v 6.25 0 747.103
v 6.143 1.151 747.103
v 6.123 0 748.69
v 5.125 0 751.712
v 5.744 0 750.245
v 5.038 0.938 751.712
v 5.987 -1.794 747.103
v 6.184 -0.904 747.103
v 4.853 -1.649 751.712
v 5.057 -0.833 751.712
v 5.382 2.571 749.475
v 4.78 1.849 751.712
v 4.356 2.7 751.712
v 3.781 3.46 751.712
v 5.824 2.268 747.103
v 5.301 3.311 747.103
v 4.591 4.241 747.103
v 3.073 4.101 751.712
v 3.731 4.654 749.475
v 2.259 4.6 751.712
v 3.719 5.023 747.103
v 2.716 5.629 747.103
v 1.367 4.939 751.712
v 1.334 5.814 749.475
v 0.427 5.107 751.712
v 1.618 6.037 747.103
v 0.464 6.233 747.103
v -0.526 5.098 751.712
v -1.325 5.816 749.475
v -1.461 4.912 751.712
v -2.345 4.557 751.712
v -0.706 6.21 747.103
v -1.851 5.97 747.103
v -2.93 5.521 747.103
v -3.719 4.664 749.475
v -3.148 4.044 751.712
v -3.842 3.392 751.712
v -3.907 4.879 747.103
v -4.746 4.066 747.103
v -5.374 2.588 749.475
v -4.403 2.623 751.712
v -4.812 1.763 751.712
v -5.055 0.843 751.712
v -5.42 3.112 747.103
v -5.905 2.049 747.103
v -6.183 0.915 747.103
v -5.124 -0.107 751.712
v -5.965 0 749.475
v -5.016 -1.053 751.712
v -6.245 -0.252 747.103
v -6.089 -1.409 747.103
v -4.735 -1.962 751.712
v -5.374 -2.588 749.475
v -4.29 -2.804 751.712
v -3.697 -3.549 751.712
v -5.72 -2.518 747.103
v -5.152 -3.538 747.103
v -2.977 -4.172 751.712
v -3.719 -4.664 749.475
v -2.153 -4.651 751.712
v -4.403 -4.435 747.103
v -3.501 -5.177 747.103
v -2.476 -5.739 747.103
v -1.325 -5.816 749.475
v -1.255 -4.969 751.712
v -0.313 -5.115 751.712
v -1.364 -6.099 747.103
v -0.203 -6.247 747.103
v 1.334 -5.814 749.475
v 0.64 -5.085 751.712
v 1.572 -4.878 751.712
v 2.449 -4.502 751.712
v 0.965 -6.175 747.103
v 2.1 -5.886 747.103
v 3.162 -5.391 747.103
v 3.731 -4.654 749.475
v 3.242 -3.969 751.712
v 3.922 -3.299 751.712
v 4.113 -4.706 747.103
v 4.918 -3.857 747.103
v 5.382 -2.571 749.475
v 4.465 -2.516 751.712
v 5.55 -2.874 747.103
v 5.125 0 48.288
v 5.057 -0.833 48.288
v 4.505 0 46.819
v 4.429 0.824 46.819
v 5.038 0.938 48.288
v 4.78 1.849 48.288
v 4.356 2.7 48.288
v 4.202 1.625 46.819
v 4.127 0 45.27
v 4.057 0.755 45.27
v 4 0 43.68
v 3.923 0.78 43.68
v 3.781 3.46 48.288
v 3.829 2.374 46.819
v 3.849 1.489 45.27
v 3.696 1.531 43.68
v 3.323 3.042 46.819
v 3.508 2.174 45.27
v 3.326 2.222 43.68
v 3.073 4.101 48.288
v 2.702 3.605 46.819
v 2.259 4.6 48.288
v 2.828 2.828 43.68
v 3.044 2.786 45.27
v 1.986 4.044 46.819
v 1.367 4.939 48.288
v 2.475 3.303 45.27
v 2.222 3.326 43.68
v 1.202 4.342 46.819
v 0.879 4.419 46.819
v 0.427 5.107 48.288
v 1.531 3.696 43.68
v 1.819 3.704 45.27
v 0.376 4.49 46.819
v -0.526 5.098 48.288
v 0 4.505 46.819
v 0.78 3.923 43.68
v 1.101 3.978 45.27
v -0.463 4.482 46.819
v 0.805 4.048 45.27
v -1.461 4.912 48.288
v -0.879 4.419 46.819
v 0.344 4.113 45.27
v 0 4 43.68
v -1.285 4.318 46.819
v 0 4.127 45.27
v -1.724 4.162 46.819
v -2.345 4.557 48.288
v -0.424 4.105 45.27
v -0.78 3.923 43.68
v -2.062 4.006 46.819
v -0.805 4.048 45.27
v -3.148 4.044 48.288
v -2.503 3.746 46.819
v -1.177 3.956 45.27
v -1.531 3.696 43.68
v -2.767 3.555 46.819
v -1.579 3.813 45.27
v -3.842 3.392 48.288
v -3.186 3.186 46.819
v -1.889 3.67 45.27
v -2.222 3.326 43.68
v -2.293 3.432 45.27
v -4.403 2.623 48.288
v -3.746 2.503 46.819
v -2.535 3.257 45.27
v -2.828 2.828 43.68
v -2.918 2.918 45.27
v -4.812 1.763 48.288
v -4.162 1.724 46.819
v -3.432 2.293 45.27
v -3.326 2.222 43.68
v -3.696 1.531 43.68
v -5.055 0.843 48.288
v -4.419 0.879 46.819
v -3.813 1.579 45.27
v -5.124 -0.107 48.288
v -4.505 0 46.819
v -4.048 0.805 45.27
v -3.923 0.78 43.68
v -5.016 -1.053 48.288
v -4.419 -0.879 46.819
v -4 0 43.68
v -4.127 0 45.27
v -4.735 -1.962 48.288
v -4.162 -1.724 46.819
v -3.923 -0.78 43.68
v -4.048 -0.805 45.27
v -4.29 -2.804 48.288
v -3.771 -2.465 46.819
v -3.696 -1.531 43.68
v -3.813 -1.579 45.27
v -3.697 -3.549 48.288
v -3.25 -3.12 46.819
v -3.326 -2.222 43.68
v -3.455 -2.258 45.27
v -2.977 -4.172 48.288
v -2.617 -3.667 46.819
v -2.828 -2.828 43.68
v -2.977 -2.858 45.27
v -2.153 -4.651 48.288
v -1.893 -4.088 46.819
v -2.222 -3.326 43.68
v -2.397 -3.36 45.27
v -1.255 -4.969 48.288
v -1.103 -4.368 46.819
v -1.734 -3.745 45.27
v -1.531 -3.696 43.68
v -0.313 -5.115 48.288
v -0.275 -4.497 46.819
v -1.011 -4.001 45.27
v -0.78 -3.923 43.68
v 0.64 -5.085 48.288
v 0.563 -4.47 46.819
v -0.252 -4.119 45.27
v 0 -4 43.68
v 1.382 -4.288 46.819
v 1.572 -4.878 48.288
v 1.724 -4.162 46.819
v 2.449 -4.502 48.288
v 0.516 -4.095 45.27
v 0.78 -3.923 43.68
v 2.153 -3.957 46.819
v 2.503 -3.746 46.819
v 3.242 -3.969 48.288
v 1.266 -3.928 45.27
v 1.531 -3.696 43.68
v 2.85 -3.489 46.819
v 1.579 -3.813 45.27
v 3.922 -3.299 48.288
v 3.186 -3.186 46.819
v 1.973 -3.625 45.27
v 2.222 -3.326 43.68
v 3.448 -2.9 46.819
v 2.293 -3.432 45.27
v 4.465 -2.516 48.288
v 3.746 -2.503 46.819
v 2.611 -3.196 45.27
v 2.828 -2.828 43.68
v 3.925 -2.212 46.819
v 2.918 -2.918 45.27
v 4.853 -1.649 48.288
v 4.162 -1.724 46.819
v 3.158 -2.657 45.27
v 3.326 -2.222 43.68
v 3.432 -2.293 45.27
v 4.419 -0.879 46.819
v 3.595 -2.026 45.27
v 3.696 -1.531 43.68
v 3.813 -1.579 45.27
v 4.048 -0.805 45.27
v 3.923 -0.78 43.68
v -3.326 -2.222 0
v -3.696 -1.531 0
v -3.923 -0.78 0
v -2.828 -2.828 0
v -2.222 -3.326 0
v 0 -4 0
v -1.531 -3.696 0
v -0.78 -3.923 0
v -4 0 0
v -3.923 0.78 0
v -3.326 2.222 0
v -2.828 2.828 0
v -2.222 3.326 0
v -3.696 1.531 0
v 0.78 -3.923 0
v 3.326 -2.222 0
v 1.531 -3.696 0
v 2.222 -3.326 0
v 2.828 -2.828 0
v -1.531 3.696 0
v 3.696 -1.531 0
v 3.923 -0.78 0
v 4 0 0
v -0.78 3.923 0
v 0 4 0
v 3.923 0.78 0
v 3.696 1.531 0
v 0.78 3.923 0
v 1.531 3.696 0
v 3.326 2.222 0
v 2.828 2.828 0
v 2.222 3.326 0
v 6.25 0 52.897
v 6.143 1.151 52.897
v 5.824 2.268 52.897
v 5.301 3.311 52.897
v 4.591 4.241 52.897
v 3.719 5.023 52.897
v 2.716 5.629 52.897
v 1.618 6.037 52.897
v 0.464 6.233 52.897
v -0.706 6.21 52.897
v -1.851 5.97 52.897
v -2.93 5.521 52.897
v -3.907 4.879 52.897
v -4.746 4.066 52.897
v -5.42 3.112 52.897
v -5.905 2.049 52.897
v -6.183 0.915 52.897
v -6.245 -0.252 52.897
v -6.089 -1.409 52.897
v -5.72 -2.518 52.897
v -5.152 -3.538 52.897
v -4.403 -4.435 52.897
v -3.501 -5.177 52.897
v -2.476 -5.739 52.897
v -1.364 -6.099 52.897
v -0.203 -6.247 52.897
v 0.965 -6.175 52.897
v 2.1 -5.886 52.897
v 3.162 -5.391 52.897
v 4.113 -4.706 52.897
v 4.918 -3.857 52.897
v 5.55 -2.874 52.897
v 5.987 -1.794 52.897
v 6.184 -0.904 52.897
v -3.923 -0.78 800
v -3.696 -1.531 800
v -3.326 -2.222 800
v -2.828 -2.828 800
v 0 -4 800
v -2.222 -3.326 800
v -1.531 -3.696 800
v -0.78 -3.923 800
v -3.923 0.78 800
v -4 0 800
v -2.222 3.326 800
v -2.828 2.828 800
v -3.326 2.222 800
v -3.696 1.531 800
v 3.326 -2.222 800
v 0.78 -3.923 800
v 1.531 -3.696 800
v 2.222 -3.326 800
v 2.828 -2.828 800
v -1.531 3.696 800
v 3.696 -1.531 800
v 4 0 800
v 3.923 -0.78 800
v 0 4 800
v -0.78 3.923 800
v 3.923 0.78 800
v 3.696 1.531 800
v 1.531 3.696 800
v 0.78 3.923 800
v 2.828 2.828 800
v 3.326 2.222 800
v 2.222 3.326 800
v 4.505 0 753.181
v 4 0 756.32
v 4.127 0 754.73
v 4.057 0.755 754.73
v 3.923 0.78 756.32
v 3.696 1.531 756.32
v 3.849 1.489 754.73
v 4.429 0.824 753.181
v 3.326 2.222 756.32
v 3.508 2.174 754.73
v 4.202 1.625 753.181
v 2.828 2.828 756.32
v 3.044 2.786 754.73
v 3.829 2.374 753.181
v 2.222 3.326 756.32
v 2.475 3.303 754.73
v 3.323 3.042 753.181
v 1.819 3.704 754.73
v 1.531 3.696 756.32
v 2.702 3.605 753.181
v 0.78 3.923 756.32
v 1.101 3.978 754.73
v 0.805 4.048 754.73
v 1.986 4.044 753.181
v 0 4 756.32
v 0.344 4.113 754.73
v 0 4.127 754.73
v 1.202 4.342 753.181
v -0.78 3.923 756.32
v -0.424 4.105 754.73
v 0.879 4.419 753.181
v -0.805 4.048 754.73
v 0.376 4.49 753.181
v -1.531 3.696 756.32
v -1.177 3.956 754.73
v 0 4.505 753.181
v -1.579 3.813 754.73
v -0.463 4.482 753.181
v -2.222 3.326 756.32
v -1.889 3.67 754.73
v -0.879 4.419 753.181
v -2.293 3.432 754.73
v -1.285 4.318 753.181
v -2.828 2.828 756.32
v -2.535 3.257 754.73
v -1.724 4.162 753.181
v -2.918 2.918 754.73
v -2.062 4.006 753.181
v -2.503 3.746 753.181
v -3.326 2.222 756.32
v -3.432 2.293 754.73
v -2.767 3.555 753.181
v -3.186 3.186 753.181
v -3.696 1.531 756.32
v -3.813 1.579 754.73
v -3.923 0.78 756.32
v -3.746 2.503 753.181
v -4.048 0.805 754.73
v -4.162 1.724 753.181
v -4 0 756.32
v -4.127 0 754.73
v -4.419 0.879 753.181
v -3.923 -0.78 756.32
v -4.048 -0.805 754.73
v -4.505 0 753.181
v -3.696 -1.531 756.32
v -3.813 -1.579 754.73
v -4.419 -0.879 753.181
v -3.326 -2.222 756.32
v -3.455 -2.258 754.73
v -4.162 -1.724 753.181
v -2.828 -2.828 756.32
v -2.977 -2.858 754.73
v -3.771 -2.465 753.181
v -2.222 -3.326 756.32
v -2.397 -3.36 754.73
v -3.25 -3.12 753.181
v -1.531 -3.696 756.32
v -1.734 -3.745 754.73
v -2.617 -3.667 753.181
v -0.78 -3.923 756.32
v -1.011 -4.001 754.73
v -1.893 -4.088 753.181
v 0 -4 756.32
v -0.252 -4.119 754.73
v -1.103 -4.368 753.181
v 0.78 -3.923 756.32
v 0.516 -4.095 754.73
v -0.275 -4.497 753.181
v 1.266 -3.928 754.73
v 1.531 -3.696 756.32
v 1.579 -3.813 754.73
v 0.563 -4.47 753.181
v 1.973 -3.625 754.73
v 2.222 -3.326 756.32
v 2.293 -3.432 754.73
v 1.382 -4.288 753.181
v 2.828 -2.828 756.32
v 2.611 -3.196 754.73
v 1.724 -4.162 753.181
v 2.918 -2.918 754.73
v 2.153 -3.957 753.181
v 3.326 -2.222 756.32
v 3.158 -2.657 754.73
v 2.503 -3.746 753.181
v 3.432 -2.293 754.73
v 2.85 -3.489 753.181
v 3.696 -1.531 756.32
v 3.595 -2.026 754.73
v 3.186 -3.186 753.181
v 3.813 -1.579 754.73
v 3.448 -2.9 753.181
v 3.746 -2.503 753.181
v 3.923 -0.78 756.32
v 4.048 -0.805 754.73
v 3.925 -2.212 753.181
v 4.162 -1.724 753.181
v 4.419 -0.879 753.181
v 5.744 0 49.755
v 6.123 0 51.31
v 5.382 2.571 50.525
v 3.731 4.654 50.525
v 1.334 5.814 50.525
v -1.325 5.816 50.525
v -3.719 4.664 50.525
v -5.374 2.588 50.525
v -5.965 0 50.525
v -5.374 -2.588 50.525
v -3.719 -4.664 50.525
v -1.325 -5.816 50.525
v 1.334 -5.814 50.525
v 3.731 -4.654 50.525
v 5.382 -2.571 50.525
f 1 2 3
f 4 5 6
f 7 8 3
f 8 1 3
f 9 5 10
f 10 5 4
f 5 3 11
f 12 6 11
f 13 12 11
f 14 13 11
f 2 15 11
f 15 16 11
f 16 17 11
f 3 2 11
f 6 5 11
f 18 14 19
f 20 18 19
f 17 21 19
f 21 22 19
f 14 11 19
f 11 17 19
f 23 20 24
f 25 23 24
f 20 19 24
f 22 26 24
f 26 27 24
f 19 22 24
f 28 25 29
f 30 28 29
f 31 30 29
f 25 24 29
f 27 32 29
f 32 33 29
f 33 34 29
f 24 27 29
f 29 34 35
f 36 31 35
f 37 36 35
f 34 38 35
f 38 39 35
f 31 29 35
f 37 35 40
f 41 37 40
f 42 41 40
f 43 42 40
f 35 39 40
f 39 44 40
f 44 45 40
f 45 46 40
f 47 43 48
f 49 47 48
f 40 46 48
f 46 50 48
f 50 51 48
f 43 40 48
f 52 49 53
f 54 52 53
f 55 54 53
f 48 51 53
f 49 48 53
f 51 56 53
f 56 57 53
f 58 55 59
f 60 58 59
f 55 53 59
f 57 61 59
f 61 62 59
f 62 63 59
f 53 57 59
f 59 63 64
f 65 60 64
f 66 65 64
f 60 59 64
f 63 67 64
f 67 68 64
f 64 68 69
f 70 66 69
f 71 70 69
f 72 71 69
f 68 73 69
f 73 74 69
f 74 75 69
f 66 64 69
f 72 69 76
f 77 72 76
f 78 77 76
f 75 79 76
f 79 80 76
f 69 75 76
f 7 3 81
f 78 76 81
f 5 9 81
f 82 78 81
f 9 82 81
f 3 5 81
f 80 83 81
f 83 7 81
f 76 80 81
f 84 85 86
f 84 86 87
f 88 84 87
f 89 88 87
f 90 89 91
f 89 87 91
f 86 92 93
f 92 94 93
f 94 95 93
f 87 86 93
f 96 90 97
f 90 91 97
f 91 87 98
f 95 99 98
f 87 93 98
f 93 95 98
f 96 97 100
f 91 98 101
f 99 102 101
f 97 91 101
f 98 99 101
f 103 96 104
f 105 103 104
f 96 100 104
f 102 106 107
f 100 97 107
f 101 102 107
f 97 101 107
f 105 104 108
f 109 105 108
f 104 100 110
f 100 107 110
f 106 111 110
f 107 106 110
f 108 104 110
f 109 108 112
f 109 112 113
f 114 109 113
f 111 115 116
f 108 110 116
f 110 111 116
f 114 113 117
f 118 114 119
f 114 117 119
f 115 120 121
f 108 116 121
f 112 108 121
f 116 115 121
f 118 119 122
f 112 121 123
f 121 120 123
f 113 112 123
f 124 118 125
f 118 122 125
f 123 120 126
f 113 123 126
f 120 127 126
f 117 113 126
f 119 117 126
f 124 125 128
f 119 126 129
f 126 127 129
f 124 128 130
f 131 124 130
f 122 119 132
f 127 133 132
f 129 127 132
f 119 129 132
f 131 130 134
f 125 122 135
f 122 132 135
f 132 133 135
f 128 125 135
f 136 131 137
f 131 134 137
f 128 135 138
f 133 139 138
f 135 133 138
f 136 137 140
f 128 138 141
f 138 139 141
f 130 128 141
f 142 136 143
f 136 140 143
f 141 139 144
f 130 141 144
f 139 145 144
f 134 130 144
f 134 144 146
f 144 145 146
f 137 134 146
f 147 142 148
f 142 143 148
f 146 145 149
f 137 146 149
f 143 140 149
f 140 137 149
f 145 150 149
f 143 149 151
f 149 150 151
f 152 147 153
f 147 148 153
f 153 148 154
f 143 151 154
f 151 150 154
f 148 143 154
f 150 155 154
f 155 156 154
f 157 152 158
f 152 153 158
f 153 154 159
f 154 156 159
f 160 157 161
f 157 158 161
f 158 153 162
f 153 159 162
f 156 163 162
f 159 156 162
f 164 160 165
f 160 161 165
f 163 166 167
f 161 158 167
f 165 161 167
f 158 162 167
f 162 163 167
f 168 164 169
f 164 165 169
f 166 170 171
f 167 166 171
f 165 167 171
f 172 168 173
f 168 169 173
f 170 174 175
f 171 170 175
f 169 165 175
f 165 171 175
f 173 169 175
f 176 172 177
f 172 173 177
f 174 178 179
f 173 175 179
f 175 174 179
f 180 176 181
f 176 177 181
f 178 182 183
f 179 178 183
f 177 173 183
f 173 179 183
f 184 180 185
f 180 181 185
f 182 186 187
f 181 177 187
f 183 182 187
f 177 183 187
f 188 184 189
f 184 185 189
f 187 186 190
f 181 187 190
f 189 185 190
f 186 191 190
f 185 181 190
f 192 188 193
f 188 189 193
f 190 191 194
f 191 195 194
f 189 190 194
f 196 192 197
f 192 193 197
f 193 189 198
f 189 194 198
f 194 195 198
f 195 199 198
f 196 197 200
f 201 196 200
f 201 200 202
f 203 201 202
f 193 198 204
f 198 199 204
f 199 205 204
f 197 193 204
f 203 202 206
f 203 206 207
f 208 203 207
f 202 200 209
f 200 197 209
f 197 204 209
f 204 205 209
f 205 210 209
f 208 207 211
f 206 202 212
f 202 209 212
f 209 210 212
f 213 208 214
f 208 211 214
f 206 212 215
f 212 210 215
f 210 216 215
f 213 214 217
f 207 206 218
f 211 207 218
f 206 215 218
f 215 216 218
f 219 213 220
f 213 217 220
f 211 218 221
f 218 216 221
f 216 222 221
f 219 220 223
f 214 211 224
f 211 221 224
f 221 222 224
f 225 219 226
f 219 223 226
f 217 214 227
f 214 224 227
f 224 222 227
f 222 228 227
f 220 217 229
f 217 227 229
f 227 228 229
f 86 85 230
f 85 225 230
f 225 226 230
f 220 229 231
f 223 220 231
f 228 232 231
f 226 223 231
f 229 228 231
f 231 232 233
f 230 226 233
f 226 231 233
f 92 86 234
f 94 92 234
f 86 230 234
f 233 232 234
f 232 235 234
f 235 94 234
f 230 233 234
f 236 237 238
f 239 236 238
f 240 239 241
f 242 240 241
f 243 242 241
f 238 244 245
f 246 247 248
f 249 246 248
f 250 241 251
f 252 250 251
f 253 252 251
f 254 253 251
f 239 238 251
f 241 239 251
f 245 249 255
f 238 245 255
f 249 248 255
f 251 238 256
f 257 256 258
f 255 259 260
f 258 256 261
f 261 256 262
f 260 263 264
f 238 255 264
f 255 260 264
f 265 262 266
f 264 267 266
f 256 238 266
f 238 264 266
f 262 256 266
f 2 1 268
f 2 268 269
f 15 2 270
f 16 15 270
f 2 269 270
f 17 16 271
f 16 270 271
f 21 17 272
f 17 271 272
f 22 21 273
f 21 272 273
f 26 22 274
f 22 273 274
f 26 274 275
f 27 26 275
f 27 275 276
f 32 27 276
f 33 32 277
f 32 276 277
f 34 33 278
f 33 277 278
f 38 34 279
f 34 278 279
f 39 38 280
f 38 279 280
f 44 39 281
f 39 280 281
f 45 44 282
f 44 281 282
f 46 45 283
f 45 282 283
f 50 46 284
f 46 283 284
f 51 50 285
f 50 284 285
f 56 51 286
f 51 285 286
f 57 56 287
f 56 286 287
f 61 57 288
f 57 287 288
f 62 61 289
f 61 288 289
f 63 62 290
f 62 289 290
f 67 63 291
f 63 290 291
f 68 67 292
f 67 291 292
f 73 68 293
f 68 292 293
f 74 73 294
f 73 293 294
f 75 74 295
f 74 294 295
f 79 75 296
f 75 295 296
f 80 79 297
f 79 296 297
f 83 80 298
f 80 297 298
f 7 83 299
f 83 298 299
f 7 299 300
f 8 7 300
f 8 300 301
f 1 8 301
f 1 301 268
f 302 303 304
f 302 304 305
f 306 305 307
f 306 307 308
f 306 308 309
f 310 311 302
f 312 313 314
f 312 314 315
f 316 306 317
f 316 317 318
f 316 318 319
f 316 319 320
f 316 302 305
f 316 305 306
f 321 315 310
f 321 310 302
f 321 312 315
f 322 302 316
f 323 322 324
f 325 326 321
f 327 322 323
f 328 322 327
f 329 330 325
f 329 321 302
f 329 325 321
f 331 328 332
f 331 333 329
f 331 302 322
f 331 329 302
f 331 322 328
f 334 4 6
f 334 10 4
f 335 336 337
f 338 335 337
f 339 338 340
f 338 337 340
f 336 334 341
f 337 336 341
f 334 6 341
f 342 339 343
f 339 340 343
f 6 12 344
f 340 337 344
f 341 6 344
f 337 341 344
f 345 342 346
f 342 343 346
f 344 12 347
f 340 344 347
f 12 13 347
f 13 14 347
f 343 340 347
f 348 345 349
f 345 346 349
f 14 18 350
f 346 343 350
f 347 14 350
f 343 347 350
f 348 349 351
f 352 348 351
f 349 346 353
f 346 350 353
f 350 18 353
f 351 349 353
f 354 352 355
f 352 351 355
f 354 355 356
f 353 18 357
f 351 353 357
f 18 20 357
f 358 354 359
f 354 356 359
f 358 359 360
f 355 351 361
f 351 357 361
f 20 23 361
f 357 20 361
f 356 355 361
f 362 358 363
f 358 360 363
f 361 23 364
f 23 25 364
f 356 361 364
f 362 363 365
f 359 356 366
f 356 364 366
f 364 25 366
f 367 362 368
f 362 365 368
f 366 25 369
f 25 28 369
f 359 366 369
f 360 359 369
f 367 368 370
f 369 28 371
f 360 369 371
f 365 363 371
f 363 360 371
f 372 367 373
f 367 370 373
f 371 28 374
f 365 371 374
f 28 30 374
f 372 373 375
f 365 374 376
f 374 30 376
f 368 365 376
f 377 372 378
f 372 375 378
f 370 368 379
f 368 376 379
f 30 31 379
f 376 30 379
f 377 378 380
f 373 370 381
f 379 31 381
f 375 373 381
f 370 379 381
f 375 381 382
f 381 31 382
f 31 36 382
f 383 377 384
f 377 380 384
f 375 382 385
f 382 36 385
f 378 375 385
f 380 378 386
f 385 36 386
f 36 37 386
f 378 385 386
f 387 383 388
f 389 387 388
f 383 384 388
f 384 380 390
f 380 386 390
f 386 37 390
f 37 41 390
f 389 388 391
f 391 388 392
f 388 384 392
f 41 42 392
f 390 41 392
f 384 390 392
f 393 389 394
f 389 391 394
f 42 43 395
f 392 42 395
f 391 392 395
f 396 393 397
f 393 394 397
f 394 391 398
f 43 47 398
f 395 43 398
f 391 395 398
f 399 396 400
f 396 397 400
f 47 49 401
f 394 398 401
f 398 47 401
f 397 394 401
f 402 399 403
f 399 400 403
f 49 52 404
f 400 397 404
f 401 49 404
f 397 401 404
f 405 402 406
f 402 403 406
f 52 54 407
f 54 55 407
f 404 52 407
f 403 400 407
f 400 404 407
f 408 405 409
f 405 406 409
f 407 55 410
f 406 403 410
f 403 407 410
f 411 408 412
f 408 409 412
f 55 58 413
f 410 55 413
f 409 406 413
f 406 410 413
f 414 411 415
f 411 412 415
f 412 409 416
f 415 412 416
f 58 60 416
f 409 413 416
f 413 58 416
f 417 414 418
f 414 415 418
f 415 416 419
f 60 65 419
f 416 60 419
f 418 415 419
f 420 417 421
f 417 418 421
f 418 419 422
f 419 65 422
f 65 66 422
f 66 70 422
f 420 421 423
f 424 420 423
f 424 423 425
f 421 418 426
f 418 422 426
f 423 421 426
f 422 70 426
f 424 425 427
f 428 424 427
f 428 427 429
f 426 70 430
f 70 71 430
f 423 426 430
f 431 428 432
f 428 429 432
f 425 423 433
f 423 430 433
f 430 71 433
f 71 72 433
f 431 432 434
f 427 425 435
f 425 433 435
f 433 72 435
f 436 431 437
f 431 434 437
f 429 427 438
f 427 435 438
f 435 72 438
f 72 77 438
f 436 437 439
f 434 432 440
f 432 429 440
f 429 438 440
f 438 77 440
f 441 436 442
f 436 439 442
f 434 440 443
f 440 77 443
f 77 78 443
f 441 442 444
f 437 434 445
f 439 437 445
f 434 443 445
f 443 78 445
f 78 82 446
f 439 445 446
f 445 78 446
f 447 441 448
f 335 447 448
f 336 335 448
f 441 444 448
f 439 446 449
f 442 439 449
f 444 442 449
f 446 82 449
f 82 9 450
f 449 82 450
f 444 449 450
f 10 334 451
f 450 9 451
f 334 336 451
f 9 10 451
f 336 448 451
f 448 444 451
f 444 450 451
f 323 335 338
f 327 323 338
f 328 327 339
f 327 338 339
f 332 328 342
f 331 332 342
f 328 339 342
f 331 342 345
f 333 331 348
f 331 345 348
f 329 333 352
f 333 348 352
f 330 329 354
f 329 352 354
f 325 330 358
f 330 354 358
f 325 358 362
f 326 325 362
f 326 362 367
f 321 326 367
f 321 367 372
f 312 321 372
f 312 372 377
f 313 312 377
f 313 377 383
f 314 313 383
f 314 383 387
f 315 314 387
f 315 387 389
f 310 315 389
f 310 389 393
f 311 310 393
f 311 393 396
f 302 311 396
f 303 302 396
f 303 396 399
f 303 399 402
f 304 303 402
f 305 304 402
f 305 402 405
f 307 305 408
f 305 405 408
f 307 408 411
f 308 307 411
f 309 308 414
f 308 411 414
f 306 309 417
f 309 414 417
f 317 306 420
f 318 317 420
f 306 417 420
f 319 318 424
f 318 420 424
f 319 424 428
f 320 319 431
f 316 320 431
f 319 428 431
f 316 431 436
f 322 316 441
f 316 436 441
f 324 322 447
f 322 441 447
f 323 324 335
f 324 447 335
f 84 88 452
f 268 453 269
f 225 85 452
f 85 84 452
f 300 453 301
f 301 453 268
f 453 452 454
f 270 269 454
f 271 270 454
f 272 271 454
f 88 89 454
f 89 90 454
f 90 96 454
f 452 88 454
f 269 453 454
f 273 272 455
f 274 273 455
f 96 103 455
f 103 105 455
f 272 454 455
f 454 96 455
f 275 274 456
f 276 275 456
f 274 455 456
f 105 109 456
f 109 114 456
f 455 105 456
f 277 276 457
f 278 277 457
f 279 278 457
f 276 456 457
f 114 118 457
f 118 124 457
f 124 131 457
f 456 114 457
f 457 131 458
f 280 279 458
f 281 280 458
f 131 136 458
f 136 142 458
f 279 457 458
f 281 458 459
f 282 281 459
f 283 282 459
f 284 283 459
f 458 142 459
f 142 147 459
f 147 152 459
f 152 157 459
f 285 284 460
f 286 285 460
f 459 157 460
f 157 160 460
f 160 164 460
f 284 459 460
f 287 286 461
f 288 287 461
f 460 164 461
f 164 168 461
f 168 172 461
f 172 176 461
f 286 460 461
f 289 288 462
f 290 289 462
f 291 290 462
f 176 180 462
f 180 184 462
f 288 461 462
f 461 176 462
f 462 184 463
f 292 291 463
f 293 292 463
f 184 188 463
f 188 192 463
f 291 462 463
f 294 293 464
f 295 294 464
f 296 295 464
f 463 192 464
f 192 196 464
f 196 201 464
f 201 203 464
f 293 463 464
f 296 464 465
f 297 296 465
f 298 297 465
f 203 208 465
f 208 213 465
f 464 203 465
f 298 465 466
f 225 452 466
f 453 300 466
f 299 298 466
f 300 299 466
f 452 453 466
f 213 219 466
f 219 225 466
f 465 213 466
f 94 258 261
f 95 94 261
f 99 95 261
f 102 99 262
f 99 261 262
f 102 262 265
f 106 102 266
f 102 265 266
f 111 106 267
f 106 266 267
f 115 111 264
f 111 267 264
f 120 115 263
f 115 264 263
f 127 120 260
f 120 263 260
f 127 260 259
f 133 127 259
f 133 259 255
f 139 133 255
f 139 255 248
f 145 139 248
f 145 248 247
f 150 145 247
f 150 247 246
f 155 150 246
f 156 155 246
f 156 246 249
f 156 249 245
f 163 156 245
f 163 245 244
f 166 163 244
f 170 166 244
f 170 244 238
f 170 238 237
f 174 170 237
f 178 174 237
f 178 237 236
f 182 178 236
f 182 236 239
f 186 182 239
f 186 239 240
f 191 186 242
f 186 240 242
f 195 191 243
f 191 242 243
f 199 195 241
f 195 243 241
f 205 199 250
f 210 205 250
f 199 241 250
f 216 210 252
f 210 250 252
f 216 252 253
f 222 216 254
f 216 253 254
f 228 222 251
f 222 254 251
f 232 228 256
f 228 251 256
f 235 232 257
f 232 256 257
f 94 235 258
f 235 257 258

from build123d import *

# Parameters (mm, degrees)
SKETCH1_R           = 4
BOSS_EXTRUDE1_DEPTH = 50
SKETCH2_R           = 6.25
BOSS_EXTRUDE2_DEPTH = 700
SKETCH3_R           = 4
BOSS_EXTRUDE3_DEPTH = 50
FILLET1_R           = 10
FILLET2_R           = 10


with BuildPart() as part:
    # Sketch1 → Boss-Extrude1 (new body)
    with BuildSketch(Plane.XY):
        Circle(SKETCH1_R)
    extrude(amount=BOSS_EXTRUDE1_DEPTH)

    # Sketch2 → Boss-Extrude2 (add)
    with BuildSketch(Plane.XY.offset(50)):
        Circle(SKETCH2_R)
    extrude(amount=BOSS_EXTRUDE2_DEPTH)

    # Sketch3 → Boss-Extrude3 (add)
    with BuildSketch(Plane.XY.offset(750)):
        Circle(SKETCH3_R)
    extrude(amount=BOSS_EXTRUDE3_DEPTH)

    # Fillet1
    # the kernel refuses this fillet: 10 mm, written as the material it adds along each edge
    with BuildSketch(Plane(origin=(0, 0, 750), x_dir=(1, 0, 0), z_dir=(0, -1, 0))) as fillet1_piece_1:
        with BuildLine():
            CenterArc((14, 6.31961233), FILLET1_R, 180, 39.194967426)
            Line((4, 6.31961233), (3.8, 6.31961233))
            Line((3.8, 6.31961233), (3.8, 0))
            Line((3.8, 0), (4, -0.2))
            ThreePointArc((4, -0.2), (5.125, -0.2), (6.095, -0.126392247))
            Line((6.095, -0.126392247), (6.25, 0))
        make_face()
    revolve(axis=Axis((0, 0, 750), (0, 0, 1)))
    with BuildSketch(Plane(origin=(0, 0, 50), x_dir=(1, 0, 0), z_dir=(0, -1, 0))) as fillet1_piece_2:
        with BuildLine():
            CenterArc((14, -6.31961233), FILLET1_R, 140.805032574, 39.194967426)
            Line((4, -6.31961233), (3.8, -6.31961233))
            Line((3.8, -6.31961233), (3.8, 0))
            Line((3.8, 0), (4, 0.2))
            ThreePointArc((4, 0.2), (5.125, 0.2), (6.095, 0.126392247))
            Line((6.095, 0.126392247), (6.25, 0))
        make_face()
    revolve(axis=Axis((0, 0, 50), (0, 0, 1)))

    # Fillet2
    fillet2_edges = [part.edges().sort_by_distance(p)[0] for p in [
        (-6.25, 0, 50),
        (-6.25, 0, 750),
    ]]
    fillet(fillet2_edges, radius=FILLET2_R)


solid = part.part
